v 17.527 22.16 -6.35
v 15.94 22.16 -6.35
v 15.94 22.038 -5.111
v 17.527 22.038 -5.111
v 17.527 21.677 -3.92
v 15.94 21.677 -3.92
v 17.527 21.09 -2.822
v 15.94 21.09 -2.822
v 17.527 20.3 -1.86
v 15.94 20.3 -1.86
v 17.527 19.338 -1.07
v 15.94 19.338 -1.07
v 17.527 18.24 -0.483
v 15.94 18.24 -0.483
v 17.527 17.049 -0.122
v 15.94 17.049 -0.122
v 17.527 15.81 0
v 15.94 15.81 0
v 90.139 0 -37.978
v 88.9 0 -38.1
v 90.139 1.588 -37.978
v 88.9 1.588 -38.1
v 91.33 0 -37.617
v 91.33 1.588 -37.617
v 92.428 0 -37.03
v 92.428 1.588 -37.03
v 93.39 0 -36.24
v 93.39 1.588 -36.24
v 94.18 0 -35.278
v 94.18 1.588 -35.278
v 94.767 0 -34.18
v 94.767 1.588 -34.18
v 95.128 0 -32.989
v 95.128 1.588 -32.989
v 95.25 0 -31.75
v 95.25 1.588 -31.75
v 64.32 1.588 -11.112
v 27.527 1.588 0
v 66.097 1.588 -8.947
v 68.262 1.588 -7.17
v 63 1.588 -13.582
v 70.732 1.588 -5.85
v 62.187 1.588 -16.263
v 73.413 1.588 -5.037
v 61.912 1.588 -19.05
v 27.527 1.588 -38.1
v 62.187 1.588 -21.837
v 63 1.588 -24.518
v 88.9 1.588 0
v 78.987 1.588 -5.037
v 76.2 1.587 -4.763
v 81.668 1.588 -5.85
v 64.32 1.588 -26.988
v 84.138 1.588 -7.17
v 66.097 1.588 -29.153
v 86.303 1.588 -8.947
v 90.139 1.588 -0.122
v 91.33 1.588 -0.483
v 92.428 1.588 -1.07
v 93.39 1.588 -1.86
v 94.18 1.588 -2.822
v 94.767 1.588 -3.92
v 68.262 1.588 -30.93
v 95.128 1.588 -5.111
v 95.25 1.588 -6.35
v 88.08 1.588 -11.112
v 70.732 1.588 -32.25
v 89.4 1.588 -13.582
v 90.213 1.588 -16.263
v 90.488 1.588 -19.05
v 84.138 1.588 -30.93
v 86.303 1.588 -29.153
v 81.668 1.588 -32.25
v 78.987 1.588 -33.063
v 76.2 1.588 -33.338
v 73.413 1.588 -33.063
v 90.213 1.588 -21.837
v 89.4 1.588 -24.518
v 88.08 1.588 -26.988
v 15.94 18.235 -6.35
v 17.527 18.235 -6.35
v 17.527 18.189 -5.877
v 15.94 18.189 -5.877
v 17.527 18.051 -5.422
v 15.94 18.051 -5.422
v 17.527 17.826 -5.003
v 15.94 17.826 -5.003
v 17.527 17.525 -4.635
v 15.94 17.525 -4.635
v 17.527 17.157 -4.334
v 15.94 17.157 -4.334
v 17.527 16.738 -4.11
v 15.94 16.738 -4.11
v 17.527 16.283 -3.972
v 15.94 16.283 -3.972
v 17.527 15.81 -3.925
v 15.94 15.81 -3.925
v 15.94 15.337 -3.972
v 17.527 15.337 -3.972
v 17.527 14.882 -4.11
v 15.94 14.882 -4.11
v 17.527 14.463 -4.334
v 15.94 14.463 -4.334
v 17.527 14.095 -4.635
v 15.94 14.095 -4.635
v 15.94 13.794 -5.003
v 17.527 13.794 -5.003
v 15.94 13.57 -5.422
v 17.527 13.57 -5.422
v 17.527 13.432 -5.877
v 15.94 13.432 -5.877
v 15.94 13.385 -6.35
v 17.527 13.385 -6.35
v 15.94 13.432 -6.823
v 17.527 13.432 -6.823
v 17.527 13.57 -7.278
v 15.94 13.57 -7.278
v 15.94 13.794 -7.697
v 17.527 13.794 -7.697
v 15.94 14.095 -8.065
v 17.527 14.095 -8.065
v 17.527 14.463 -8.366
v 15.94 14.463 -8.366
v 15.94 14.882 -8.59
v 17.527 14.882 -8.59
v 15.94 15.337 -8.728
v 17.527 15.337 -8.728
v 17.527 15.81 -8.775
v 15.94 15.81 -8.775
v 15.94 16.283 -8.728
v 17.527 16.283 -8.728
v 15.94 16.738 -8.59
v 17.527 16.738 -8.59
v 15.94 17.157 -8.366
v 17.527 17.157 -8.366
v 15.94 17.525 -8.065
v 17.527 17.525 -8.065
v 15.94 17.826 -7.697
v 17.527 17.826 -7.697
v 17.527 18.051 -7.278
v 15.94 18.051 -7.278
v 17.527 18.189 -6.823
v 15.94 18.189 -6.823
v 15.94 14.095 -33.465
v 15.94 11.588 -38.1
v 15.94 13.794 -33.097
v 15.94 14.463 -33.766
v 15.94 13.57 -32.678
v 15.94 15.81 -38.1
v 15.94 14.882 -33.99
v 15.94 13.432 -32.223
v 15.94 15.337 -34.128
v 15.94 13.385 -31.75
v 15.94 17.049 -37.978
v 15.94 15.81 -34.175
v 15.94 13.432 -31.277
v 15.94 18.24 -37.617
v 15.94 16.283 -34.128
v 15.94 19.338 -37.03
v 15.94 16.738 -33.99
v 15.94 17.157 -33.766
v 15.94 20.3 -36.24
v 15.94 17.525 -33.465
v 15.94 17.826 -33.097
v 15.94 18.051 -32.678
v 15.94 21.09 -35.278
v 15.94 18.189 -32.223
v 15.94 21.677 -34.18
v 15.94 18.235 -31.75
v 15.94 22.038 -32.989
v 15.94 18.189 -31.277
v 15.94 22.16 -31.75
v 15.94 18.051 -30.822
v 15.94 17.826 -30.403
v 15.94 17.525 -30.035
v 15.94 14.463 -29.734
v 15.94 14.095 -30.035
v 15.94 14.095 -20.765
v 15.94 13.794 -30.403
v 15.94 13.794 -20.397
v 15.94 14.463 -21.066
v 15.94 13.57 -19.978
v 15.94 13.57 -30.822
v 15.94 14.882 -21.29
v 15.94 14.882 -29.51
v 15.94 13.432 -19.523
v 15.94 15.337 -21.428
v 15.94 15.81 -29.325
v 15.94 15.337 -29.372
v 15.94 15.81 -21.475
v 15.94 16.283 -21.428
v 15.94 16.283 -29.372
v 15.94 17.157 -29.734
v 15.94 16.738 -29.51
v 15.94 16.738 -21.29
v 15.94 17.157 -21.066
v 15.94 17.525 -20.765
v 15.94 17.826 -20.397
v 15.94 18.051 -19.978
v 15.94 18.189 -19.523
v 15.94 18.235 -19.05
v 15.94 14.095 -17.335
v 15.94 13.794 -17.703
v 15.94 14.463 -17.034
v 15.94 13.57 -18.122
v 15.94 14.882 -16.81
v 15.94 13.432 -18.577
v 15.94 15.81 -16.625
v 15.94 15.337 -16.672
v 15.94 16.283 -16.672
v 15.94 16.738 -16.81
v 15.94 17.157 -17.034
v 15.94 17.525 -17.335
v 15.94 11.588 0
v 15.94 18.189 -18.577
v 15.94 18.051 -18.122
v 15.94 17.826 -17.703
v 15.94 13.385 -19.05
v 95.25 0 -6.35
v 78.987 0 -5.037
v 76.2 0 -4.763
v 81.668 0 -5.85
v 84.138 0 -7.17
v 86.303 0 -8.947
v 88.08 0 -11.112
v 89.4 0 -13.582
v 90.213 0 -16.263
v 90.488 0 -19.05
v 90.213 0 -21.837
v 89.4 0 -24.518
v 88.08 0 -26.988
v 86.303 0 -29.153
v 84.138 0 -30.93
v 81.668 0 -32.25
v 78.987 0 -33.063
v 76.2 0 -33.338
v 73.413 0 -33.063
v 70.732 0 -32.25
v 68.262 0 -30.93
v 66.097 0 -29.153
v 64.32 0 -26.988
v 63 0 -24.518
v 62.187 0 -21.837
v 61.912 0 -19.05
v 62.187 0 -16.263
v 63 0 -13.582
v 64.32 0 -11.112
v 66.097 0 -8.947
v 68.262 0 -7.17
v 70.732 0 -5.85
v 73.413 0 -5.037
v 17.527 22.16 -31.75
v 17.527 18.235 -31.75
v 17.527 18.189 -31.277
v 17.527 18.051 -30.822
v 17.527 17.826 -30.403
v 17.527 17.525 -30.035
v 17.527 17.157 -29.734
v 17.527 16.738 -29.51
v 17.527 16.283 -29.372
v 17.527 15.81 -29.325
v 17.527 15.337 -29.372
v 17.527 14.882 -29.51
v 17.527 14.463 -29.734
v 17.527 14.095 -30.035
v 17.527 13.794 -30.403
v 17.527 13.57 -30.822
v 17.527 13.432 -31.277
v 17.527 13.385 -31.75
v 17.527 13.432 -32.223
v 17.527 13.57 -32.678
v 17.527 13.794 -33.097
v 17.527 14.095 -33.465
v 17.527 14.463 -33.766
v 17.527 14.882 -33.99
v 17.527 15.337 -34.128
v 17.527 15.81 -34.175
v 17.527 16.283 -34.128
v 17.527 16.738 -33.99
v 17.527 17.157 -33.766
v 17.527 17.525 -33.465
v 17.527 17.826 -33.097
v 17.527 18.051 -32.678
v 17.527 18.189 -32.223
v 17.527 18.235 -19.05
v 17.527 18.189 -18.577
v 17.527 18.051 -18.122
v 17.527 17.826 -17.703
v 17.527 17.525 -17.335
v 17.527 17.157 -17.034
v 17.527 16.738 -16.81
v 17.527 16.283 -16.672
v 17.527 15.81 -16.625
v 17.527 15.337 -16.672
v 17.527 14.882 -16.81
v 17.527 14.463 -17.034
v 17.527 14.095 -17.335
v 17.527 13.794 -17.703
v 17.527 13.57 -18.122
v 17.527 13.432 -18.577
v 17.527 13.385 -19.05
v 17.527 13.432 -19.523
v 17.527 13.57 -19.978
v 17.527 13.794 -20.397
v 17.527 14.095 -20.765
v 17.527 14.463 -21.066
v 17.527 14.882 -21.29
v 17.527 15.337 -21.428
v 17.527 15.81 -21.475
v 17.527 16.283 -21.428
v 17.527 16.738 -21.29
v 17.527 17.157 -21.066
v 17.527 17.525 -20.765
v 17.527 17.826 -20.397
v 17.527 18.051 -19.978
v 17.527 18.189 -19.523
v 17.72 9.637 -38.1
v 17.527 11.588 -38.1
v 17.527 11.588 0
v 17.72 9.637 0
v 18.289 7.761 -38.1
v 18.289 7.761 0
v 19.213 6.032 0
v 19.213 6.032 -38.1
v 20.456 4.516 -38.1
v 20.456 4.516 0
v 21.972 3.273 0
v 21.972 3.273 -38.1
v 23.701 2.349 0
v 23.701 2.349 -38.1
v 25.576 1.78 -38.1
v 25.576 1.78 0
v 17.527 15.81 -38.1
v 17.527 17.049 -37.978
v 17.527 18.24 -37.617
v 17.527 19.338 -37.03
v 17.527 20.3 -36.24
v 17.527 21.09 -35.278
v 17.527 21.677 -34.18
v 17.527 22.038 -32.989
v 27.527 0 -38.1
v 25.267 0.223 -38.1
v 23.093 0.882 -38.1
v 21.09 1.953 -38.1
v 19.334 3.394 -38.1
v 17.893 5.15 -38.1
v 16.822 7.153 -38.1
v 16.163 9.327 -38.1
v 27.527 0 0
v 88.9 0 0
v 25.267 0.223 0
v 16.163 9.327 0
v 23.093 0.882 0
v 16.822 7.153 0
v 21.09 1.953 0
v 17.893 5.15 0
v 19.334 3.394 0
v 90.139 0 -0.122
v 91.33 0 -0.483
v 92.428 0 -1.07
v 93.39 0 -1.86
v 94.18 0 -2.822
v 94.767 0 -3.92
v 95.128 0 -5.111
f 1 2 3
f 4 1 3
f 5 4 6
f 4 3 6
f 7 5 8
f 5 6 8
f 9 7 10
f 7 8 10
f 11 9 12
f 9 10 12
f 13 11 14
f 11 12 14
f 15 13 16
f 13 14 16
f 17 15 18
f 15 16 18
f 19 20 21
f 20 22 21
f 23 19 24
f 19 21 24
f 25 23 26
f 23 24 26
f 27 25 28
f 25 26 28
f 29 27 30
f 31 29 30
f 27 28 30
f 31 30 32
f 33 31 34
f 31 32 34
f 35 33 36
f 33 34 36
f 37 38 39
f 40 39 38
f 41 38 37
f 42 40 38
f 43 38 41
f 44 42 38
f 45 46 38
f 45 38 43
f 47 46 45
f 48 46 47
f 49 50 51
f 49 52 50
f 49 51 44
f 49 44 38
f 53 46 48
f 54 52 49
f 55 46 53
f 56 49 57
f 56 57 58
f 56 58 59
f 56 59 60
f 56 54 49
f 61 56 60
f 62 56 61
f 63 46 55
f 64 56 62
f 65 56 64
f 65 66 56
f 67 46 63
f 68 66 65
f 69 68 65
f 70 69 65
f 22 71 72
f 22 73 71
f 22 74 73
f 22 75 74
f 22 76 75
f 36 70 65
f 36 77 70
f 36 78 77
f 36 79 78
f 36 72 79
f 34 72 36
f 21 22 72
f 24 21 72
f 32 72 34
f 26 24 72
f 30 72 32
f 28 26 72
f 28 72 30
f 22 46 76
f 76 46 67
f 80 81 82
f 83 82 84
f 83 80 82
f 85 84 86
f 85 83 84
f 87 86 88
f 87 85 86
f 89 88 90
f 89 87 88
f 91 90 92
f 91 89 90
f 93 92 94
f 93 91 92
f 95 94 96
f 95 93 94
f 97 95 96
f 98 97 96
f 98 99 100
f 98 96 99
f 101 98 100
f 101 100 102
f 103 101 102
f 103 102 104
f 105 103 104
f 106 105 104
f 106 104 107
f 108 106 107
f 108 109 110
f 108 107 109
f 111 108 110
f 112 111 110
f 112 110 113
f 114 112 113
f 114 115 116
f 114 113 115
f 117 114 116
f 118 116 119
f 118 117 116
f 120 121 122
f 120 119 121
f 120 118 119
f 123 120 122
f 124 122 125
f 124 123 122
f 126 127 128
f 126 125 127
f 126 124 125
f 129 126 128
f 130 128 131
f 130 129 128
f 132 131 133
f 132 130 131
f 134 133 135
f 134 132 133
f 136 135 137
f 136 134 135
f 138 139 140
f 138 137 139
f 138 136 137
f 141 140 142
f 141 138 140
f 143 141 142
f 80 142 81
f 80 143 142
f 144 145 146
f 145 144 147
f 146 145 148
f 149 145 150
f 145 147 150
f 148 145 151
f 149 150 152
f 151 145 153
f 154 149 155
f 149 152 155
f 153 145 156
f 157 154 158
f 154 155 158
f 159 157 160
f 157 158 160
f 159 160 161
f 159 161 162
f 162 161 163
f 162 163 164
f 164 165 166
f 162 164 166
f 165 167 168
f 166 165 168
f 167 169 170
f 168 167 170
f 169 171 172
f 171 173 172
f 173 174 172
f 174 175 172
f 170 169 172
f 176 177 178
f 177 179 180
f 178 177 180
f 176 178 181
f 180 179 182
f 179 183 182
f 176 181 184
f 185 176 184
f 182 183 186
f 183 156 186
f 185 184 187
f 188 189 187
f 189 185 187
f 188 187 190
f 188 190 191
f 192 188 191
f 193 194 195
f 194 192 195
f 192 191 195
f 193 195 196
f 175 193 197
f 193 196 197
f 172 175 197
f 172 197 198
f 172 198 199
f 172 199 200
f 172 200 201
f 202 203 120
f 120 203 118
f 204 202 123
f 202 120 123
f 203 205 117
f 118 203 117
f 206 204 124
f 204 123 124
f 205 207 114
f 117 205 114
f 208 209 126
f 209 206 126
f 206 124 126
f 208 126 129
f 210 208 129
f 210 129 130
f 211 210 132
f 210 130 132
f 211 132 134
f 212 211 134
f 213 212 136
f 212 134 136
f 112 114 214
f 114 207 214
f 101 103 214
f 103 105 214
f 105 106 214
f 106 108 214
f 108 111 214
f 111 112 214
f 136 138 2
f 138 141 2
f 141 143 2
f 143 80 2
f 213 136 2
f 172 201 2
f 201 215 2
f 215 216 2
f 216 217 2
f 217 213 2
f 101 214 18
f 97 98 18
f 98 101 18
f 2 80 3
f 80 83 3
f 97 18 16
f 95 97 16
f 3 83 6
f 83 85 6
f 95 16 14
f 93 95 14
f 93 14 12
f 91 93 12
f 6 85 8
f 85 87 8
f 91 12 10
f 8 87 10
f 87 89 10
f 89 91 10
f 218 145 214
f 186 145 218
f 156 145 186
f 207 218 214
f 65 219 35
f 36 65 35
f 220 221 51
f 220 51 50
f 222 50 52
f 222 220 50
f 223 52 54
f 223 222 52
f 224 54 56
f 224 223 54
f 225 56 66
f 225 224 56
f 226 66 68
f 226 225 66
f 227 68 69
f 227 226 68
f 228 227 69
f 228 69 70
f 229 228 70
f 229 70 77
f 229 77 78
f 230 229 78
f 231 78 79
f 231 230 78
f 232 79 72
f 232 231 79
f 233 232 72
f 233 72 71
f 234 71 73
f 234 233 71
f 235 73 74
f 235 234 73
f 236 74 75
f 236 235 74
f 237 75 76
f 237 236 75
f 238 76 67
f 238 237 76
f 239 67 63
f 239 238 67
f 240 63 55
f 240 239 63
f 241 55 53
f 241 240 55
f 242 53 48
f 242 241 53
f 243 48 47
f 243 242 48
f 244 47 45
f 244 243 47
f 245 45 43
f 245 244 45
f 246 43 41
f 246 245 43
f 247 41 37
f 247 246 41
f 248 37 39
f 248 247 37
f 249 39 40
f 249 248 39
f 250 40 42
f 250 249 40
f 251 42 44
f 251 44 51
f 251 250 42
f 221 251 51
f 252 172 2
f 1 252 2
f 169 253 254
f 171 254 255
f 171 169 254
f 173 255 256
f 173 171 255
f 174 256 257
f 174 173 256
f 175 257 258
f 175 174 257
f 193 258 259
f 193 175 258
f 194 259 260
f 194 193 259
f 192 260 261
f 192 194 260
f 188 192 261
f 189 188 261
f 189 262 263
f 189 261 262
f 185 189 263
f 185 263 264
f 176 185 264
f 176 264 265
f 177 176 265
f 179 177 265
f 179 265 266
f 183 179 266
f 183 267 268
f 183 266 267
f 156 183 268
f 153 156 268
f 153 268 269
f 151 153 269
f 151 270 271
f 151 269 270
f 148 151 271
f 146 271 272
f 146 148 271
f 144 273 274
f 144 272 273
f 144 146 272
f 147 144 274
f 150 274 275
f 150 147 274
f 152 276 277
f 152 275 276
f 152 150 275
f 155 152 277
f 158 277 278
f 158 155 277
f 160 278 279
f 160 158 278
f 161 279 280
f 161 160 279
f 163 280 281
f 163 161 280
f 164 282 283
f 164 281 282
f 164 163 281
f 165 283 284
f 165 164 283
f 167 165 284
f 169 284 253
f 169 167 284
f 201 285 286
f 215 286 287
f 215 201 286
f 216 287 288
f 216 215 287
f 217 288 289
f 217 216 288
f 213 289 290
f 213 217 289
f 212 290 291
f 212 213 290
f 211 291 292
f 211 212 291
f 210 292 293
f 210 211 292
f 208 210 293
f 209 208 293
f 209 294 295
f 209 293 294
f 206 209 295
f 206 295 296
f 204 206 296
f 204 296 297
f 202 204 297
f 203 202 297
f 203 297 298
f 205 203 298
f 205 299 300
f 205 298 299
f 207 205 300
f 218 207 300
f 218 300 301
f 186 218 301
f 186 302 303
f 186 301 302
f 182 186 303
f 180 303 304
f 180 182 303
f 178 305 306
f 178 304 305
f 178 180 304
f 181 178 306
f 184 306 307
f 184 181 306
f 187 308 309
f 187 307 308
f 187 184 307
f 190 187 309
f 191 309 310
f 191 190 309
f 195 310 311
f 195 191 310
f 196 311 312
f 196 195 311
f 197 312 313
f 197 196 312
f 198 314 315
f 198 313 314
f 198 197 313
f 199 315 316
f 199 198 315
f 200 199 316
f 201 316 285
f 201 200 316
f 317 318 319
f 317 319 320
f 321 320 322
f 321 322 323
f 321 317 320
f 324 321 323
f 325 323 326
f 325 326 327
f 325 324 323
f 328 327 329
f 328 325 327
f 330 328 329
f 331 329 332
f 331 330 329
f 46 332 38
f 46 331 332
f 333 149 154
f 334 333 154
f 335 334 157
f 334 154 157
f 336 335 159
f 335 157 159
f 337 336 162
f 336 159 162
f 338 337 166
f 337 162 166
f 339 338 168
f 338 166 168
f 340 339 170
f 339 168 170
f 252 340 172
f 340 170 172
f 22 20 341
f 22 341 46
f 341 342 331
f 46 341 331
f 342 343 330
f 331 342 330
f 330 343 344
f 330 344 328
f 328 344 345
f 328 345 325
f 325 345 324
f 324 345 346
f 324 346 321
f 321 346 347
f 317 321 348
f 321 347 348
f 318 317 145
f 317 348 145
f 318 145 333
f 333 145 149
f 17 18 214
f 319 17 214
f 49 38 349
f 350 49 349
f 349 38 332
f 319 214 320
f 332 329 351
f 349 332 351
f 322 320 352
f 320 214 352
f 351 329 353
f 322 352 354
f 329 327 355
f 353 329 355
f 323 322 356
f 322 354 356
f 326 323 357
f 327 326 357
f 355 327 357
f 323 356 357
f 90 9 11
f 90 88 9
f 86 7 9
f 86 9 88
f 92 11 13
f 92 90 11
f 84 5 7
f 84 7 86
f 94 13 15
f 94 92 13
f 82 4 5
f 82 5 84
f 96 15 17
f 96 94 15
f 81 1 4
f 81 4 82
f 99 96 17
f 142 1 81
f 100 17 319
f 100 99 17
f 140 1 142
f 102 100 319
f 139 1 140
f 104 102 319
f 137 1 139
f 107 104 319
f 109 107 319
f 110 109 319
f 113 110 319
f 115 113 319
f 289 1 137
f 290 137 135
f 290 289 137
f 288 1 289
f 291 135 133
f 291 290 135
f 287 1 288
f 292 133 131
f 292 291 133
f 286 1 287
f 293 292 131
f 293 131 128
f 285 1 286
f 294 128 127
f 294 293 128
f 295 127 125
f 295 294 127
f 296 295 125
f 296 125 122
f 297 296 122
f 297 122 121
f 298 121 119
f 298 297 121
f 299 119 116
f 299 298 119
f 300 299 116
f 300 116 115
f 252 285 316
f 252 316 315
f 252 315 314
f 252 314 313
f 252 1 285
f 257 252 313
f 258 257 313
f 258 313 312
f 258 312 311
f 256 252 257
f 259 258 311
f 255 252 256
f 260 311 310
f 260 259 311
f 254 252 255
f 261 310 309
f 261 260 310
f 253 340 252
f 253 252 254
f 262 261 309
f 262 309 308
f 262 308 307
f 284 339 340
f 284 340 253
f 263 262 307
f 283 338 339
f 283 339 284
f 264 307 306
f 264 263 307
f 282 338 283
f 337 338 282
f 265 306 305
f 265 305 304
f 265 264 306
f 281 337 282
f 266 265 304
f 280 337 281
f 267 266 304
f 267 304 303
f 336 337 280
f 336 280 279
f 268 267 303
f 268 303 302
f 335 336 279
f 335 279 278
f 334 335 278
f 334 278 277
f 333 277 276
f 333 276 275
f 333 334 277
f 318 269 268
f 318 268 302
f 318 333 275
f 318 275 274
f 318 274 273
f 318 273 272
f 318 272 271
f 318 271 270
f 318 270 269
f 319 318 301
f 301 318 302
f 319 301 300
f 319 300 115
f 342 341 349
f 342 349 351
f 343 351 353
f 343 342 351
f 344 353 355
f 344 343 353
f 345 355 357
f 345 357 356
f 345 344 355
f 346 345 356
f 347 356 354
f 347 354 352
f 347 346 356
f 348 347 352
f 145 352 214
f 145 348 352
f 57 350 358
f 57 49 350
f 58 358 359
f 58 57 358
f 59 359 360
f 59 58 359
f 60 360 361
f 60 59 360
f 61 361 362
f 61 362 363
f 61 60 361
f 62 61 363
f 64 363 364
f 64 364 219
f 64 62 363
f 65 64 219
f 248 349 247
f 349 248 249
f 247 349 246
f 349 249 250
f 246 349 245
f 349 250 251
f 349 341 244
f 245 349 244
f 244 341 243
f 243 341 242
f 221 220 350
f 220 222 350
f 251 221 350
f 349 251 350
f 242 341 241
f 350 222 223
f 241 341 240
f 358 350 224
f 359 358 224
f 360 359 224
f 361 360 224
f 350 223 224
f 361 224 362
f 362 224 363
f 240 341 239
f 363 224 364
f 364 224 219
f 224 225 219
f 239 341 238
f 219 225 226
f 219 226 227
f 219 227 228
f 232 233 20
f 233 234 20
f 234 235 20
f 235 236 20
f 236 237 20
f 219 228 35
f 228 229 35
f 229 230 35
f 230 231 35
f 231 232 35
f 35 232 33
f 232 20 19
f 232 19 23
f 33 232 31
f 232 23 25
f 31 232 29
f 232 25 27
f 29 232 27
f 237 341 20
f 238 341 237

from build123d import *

# Parameters (mm, degrees)
SKETCH1_W                  = 19.05
SKETCH1_H                  = 38.1
SKETCH1_R                  = 2.425
SKETCH1_R_2                = 14.2875
BOSS_EXTRUDE2_DEPTH        = 1.5875
FILLET2_R                  = 6.35
SKETCHED_BEND2_OUTLINE_W   = 1.5875
SKETCHED_BEND2_OUTLINE_H   = 38.1
SKETCHED_BEND2_DEPTH       = 17.527391426
SKETCHED_START             = 15.939891426
SKETCHED_BEND2_2_OUTLINE_R = 2.425
SKETCHED_BEND2_2_DEPTH     = 11.5875
SKETCHED_START_2           = -38.1
SKETCHED_BEND2_3_DEPTH     = 38.1


with BuildPart() as part:
    # Sketch1 → Boss-Extrude2 (new body)
    # profile 1 of 3: a face of its own
    with BuildSketch(Plane(origin=(0, 0, 0), x_dir=(1, 0, 0), z_dir=(0, 1, 0))):
        with Locations((9.525, 19.05)):
            Rectangle(SKETCH1_W, SKETCH1_H)
        with Locations(Location((6.35, 6.35, 0), (0, 0, 270))):
            Circle(SKETCH1_R, mode=Mode.SUBTRACT)
        with Locations(Location((6.35, 19.05, 0), (0, 0, 270))):
            Circle(SKETCH1_R, mode=Mode.SUBTRACT)
        with Locations(Location((6.35, 31.75, 0), (0, 0, 270))):
            Circle(SKETCH1_R, mode=Mode.SUBTRACT)
    # profile 2 of 3: a face of its own
    with BuildSketch(Plane(origin=(0, 0, 0), x_dir=(1, 0, 0), z_dir=(0, 1, 0))):
        Polygon((19.05, 38.1), (19.05, 0), (50.8, 0), (95.25, 0), (95.25, 38.1), (50.8, 38.1), align=None)
        with Locations(Location((76.2, 19.05, 0), (0, 0, 270))):
            Circle(SKETCH1_R_2, mode=Mode.SUBTRACT)
    # profile 3 of 3: a face of its own
    with BuildSketch(Plane(origin=(0, 0, 0), x_dir=(1, 0, 0), z_dir=(0, 1, 0))):
        Polygon((19.05, 38.1), (19.05, 0), (50.8, 0), (95.25, 0), (95.25, 38.1), (50.8, 38.1), align=None)
        with Locations(Location((76.2, 19.05, 0), (0, 0, 270))):
            Circle(SKETCH1_R_2, mode=Mode.SUBTRACT)
    extrude(amount=BOSS_EXTRUDE2_DEPTH)

    # Fillet2
    fillet2_edges = [part.edges().sort_by_distance(p)[0] for p in [
        (0, 0.79375, 0),
        (0, 0.79375, -38.1),
        (95.25, 0.79375, -38.1),
        (95.25, 0.79375, 0),
    ]]
    fillet(fillet2_edges, radius=FILLET2_R)

    # Sketched Bend2: read off the stored shape, not the designer's step
    # Sketched Bend2 outline → Sketched Bend2 (cut)
    with BuildSketch(Plane.YZ):
        with Locations((0.79375, -19.05)):
            Rectangle(SKETCHED_BEND2_OUTLINE_W, SKETCHED_BEND2_OUTLINE_H)
    extrude(amount=SKETCHED_BEND2_DEPTH, mode=Mode.SUBTRACT)

    # Sketched Bend2 2 outline → Sketched Bend2 2 (add)
    with BuildSketch(Plane.YZ.offset(SKETCHED_START)):
        with BuildLine():
            Line((1.5875, -38.1), (15.810108574, -38.1))
            ThreePointArc((15.810108574, -38.1), (20.300236634, -36.240128061), (22.160108574, -31.75))
            Line((22.160108574, -31.75), (22.160108574, -6.35))
            ThreePointArc((22.160108574, -6.35), (20.300236634, -1.859871939), (15.810108574, 0))
            Line((15.810108574, 0), (1.5875, 0))
            Line((1.5875, 0), (1.5875, -38.1))
        make_face()
        with Locations((15.810108574, -31.75)):
            Circle(SKETCHED_BEND2_2_OUTLINE_R, mode=Mode.SUBTRACT)
        with Locations((15.810108574, -19.05)):
            Circle(SKETCHED_BEND2_2_OUTLINE_R, mode=Mode.SUBTRACT)
        with Locations((15.810108574, -6.35)):
            Circle(SKETCHED_BEND2_2_OUTLINE_R, mode=Mode.SUBTRACT)
    extrude(amount=SKETCHED_BEND2_2_DEPTH)

    # Sketched Bend2 3 outline → Sketched Bend2 3 (cut)
    with BuildSketch(Plane.XY.offset(SKETCHED_START_2)):
        with BuildLine():
            ThreePointArc((27.527391426, 0), (19.333791599, 3.393900173), (15.939891426, 11.5875))
            Line((15.939891426, 11.5875), (15.939891426, 1.5875))
            Line((15.939891426, 1.5875), (17.527391426, 1.5875))
            Line((17.527391426, 1.5875), (17.527391426, 0))
            Line((17.527391426, 0), (27.527391426, 0))
        make_face()
        with BuildLine():
            Line((17.527391426, 22.160108574), (17.527391426, 11.5875))
            ThreePointArc((17.527391426, 11.5875), (20.456323614, 4.516432188), (27.527391426, 1.5875))
            Line((27.527391426, 1.5875), (27.527391426, 22.160108574))
            Line((27.527391426, 22.160108574), (17.527391426, 22.160108574))
        make_face()
    extrude(amount=SKETCHED_BEND2_3_DEPTH, mode=Mode.SUBTRACT)


solid = part.part
